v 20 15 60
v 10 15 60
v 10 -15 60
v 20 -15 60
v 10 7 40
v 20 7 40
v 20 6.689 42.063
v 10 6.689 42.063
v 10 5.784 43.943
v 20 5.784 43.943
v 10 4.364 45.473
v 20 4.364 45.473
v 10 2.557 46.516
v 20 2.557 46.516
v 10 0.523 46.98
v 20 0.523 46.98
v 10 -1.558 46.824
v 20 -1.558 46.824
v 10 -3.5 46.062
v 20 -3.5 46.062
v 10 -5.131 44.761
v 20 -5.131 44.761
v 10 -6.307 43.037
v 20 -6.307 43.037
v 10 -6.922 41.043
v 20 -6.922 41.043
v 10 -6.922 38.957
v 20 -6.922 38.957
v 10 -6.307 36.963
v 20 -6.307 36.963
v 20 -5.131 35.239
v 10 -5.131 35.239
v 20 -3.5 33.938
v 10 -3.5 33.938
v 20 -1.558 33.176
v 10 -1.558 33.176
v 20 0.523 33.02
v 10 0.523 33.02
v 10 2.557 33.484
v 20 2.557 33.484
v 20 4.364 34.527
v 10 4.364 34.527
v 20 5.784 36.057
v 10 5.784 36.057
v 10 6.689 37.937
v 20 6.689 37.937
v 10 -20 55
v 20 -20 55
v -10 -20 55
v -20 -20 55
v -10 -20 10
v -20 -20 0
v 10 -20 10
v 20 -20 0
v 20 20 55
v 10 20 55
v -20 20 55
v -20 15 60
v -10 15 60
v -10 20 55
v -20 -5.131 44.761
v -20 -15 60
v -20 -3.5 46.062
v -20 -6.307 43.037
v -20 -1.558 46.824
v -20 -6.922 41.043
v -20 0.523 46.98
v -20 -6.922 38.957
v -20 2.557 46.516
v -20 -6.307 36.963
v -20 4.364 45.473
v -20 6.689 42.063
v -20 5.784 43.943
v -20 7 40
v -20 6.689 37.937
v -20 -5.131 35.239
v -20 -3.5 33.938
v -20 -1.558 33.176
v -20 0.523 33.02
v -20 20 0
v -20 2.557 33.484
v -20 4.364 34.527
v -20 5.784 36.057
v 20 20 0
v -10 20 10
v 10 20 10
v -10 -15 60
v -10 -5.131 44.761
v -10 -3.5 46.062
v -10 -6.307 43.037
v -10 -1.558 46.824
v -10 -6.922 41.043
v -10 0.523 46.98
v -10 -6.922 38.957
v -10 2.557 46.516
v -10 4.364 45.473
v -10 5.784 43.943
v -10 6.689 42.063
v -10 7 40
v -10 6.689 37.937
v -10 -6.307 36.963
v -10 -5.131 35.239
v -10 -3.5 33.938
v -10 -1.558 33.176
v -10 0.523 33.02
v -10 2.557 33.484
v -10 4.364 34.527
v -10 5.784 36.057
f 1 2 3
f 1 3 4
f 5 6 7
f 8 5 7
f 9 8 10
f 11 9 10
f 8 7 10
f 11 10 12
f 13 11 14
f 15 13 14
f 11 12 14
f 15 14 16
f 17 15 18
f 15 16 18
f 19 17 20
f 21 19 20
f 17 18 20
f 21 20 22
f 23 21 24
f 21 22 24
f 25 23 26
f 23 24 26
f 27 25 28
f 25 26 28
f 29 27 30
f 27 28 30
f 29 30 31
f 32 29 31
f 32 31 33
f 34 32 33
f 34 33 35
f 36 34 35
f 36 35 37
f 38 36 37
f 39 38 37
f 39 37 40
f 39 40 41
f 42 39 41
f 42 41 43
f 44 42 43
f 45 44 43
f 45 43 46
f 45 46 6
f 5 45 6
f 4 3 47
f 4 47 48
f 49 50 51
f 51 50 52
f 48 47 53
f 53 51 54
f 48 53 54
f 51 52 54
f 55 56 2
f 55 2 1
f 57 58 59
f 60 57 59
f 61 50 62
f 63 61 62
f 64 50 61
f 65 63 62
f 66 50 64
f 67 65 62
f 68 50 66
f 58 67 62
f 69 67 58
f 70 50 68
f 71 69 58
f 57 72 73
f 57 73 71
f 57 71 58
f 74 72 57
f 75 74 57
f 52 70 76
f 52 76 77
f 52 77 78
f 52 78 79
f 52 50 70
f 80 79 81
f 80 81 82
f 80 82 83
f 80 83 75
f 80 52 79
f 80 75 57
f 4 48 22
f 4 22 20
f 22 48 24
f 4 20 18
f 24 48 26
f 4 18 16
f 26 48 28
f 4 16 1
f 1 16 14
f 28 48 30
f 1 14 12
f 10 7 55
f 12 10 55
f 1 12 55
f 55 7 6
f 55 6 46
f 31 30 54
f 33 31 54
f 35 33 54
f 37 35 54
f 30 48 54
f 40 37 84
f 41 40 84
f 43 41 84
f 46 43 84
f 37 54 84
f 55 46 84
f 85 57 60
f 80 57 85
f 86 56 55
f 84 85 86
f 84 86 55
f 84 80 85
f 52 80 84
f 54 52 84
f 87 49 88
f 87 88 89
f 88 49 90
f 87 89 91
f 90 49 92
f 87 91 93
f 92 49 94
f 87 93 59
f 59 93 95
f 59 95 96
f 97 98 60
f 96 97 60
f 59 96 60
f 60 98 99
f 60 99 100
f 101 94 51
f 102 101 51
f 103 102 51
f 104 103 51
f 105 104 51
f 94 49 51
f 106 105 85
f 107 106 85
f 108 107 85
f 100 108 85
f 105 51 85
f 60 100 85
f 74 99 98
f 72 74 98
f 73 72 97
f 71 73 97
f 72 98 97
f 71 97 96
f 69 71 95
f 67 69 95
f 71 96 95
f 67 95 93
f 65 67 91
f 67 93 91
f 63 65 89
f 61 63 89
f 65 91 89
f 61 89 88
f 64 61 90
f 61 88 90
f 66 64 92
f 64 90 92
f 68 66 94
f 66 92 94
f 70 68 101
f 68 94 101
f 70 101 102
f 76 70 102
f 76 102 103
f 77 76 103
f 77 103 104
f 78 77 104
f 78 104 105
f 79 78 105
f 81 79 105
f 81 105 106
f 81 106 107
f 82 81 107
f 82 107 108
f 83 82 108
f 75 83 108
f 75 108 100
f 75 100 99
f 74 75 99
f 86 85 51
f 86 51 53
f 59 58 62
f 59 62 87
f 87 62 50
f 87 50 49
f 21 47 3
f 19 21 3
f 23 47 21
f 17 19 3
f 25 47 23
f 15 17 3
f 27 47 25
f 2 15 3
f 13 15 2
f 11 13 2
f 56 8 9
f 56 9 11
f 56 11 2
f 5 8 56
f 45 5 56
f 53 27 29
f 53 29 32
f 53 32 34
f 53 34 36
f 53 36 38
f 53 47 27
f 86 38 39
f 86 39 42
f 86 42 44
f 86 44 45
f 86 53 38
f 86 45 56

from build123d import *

# Parameters (mm, degrees)
F0_W     = 40
F0_H     = 40
F1_DEPTH = 10
F2_W     = 10
F2_H     = 40
F3_DEPTH = 50
F4_W     = 10
F4_H     = 40
F5_DEPTH = 50
F6_R     = 7
F7_DEPTH = 96.2
F8_SIZE  = 5


with BuildPart() as f1:
    # F0 (on Top) → F1 (new body)
    with BuildSketch(Plane.XY):
        Rectangle(F0_W, F0_H)
    extrude(amount=F1_DEPTH)

    # F2 (on face) → F3 (join)
    with BuildSketch(Plane.XY.offset(10)):
        with Locations((-15, 0)):
            Rectangle(F2_W, F2_H)
    extrude(amount=F3_DEPTH)

    # F4 (on face) → F5 (join)
    with BuildSketch(Plane.XY.offset(10)):
        with Locations((15, 0)):
            Rectangle(F4_W, F4_H)
    extrude(amount=F5_DEPTH)

    # F6 (on face) → F7 (cut)
    with BuildSketch(Plane.YZ.offset(20)):
        with Locations((0, 40)):
            Circle(F6_R)
    extrude(amount=-F7_DEPTH, mode=Mode.SUBTRACT)

    # F8
    f8_edges = [f1.edges().sort_by_distance(p)[0] for p in [
        (-15, -20, 60),
        (15, -20, 60),
        (15, 20, 60),
        (-15, 20, 60),
    ]]
    chamfer(f8_edges, length=F8_SIZE)


solid = f1.part
